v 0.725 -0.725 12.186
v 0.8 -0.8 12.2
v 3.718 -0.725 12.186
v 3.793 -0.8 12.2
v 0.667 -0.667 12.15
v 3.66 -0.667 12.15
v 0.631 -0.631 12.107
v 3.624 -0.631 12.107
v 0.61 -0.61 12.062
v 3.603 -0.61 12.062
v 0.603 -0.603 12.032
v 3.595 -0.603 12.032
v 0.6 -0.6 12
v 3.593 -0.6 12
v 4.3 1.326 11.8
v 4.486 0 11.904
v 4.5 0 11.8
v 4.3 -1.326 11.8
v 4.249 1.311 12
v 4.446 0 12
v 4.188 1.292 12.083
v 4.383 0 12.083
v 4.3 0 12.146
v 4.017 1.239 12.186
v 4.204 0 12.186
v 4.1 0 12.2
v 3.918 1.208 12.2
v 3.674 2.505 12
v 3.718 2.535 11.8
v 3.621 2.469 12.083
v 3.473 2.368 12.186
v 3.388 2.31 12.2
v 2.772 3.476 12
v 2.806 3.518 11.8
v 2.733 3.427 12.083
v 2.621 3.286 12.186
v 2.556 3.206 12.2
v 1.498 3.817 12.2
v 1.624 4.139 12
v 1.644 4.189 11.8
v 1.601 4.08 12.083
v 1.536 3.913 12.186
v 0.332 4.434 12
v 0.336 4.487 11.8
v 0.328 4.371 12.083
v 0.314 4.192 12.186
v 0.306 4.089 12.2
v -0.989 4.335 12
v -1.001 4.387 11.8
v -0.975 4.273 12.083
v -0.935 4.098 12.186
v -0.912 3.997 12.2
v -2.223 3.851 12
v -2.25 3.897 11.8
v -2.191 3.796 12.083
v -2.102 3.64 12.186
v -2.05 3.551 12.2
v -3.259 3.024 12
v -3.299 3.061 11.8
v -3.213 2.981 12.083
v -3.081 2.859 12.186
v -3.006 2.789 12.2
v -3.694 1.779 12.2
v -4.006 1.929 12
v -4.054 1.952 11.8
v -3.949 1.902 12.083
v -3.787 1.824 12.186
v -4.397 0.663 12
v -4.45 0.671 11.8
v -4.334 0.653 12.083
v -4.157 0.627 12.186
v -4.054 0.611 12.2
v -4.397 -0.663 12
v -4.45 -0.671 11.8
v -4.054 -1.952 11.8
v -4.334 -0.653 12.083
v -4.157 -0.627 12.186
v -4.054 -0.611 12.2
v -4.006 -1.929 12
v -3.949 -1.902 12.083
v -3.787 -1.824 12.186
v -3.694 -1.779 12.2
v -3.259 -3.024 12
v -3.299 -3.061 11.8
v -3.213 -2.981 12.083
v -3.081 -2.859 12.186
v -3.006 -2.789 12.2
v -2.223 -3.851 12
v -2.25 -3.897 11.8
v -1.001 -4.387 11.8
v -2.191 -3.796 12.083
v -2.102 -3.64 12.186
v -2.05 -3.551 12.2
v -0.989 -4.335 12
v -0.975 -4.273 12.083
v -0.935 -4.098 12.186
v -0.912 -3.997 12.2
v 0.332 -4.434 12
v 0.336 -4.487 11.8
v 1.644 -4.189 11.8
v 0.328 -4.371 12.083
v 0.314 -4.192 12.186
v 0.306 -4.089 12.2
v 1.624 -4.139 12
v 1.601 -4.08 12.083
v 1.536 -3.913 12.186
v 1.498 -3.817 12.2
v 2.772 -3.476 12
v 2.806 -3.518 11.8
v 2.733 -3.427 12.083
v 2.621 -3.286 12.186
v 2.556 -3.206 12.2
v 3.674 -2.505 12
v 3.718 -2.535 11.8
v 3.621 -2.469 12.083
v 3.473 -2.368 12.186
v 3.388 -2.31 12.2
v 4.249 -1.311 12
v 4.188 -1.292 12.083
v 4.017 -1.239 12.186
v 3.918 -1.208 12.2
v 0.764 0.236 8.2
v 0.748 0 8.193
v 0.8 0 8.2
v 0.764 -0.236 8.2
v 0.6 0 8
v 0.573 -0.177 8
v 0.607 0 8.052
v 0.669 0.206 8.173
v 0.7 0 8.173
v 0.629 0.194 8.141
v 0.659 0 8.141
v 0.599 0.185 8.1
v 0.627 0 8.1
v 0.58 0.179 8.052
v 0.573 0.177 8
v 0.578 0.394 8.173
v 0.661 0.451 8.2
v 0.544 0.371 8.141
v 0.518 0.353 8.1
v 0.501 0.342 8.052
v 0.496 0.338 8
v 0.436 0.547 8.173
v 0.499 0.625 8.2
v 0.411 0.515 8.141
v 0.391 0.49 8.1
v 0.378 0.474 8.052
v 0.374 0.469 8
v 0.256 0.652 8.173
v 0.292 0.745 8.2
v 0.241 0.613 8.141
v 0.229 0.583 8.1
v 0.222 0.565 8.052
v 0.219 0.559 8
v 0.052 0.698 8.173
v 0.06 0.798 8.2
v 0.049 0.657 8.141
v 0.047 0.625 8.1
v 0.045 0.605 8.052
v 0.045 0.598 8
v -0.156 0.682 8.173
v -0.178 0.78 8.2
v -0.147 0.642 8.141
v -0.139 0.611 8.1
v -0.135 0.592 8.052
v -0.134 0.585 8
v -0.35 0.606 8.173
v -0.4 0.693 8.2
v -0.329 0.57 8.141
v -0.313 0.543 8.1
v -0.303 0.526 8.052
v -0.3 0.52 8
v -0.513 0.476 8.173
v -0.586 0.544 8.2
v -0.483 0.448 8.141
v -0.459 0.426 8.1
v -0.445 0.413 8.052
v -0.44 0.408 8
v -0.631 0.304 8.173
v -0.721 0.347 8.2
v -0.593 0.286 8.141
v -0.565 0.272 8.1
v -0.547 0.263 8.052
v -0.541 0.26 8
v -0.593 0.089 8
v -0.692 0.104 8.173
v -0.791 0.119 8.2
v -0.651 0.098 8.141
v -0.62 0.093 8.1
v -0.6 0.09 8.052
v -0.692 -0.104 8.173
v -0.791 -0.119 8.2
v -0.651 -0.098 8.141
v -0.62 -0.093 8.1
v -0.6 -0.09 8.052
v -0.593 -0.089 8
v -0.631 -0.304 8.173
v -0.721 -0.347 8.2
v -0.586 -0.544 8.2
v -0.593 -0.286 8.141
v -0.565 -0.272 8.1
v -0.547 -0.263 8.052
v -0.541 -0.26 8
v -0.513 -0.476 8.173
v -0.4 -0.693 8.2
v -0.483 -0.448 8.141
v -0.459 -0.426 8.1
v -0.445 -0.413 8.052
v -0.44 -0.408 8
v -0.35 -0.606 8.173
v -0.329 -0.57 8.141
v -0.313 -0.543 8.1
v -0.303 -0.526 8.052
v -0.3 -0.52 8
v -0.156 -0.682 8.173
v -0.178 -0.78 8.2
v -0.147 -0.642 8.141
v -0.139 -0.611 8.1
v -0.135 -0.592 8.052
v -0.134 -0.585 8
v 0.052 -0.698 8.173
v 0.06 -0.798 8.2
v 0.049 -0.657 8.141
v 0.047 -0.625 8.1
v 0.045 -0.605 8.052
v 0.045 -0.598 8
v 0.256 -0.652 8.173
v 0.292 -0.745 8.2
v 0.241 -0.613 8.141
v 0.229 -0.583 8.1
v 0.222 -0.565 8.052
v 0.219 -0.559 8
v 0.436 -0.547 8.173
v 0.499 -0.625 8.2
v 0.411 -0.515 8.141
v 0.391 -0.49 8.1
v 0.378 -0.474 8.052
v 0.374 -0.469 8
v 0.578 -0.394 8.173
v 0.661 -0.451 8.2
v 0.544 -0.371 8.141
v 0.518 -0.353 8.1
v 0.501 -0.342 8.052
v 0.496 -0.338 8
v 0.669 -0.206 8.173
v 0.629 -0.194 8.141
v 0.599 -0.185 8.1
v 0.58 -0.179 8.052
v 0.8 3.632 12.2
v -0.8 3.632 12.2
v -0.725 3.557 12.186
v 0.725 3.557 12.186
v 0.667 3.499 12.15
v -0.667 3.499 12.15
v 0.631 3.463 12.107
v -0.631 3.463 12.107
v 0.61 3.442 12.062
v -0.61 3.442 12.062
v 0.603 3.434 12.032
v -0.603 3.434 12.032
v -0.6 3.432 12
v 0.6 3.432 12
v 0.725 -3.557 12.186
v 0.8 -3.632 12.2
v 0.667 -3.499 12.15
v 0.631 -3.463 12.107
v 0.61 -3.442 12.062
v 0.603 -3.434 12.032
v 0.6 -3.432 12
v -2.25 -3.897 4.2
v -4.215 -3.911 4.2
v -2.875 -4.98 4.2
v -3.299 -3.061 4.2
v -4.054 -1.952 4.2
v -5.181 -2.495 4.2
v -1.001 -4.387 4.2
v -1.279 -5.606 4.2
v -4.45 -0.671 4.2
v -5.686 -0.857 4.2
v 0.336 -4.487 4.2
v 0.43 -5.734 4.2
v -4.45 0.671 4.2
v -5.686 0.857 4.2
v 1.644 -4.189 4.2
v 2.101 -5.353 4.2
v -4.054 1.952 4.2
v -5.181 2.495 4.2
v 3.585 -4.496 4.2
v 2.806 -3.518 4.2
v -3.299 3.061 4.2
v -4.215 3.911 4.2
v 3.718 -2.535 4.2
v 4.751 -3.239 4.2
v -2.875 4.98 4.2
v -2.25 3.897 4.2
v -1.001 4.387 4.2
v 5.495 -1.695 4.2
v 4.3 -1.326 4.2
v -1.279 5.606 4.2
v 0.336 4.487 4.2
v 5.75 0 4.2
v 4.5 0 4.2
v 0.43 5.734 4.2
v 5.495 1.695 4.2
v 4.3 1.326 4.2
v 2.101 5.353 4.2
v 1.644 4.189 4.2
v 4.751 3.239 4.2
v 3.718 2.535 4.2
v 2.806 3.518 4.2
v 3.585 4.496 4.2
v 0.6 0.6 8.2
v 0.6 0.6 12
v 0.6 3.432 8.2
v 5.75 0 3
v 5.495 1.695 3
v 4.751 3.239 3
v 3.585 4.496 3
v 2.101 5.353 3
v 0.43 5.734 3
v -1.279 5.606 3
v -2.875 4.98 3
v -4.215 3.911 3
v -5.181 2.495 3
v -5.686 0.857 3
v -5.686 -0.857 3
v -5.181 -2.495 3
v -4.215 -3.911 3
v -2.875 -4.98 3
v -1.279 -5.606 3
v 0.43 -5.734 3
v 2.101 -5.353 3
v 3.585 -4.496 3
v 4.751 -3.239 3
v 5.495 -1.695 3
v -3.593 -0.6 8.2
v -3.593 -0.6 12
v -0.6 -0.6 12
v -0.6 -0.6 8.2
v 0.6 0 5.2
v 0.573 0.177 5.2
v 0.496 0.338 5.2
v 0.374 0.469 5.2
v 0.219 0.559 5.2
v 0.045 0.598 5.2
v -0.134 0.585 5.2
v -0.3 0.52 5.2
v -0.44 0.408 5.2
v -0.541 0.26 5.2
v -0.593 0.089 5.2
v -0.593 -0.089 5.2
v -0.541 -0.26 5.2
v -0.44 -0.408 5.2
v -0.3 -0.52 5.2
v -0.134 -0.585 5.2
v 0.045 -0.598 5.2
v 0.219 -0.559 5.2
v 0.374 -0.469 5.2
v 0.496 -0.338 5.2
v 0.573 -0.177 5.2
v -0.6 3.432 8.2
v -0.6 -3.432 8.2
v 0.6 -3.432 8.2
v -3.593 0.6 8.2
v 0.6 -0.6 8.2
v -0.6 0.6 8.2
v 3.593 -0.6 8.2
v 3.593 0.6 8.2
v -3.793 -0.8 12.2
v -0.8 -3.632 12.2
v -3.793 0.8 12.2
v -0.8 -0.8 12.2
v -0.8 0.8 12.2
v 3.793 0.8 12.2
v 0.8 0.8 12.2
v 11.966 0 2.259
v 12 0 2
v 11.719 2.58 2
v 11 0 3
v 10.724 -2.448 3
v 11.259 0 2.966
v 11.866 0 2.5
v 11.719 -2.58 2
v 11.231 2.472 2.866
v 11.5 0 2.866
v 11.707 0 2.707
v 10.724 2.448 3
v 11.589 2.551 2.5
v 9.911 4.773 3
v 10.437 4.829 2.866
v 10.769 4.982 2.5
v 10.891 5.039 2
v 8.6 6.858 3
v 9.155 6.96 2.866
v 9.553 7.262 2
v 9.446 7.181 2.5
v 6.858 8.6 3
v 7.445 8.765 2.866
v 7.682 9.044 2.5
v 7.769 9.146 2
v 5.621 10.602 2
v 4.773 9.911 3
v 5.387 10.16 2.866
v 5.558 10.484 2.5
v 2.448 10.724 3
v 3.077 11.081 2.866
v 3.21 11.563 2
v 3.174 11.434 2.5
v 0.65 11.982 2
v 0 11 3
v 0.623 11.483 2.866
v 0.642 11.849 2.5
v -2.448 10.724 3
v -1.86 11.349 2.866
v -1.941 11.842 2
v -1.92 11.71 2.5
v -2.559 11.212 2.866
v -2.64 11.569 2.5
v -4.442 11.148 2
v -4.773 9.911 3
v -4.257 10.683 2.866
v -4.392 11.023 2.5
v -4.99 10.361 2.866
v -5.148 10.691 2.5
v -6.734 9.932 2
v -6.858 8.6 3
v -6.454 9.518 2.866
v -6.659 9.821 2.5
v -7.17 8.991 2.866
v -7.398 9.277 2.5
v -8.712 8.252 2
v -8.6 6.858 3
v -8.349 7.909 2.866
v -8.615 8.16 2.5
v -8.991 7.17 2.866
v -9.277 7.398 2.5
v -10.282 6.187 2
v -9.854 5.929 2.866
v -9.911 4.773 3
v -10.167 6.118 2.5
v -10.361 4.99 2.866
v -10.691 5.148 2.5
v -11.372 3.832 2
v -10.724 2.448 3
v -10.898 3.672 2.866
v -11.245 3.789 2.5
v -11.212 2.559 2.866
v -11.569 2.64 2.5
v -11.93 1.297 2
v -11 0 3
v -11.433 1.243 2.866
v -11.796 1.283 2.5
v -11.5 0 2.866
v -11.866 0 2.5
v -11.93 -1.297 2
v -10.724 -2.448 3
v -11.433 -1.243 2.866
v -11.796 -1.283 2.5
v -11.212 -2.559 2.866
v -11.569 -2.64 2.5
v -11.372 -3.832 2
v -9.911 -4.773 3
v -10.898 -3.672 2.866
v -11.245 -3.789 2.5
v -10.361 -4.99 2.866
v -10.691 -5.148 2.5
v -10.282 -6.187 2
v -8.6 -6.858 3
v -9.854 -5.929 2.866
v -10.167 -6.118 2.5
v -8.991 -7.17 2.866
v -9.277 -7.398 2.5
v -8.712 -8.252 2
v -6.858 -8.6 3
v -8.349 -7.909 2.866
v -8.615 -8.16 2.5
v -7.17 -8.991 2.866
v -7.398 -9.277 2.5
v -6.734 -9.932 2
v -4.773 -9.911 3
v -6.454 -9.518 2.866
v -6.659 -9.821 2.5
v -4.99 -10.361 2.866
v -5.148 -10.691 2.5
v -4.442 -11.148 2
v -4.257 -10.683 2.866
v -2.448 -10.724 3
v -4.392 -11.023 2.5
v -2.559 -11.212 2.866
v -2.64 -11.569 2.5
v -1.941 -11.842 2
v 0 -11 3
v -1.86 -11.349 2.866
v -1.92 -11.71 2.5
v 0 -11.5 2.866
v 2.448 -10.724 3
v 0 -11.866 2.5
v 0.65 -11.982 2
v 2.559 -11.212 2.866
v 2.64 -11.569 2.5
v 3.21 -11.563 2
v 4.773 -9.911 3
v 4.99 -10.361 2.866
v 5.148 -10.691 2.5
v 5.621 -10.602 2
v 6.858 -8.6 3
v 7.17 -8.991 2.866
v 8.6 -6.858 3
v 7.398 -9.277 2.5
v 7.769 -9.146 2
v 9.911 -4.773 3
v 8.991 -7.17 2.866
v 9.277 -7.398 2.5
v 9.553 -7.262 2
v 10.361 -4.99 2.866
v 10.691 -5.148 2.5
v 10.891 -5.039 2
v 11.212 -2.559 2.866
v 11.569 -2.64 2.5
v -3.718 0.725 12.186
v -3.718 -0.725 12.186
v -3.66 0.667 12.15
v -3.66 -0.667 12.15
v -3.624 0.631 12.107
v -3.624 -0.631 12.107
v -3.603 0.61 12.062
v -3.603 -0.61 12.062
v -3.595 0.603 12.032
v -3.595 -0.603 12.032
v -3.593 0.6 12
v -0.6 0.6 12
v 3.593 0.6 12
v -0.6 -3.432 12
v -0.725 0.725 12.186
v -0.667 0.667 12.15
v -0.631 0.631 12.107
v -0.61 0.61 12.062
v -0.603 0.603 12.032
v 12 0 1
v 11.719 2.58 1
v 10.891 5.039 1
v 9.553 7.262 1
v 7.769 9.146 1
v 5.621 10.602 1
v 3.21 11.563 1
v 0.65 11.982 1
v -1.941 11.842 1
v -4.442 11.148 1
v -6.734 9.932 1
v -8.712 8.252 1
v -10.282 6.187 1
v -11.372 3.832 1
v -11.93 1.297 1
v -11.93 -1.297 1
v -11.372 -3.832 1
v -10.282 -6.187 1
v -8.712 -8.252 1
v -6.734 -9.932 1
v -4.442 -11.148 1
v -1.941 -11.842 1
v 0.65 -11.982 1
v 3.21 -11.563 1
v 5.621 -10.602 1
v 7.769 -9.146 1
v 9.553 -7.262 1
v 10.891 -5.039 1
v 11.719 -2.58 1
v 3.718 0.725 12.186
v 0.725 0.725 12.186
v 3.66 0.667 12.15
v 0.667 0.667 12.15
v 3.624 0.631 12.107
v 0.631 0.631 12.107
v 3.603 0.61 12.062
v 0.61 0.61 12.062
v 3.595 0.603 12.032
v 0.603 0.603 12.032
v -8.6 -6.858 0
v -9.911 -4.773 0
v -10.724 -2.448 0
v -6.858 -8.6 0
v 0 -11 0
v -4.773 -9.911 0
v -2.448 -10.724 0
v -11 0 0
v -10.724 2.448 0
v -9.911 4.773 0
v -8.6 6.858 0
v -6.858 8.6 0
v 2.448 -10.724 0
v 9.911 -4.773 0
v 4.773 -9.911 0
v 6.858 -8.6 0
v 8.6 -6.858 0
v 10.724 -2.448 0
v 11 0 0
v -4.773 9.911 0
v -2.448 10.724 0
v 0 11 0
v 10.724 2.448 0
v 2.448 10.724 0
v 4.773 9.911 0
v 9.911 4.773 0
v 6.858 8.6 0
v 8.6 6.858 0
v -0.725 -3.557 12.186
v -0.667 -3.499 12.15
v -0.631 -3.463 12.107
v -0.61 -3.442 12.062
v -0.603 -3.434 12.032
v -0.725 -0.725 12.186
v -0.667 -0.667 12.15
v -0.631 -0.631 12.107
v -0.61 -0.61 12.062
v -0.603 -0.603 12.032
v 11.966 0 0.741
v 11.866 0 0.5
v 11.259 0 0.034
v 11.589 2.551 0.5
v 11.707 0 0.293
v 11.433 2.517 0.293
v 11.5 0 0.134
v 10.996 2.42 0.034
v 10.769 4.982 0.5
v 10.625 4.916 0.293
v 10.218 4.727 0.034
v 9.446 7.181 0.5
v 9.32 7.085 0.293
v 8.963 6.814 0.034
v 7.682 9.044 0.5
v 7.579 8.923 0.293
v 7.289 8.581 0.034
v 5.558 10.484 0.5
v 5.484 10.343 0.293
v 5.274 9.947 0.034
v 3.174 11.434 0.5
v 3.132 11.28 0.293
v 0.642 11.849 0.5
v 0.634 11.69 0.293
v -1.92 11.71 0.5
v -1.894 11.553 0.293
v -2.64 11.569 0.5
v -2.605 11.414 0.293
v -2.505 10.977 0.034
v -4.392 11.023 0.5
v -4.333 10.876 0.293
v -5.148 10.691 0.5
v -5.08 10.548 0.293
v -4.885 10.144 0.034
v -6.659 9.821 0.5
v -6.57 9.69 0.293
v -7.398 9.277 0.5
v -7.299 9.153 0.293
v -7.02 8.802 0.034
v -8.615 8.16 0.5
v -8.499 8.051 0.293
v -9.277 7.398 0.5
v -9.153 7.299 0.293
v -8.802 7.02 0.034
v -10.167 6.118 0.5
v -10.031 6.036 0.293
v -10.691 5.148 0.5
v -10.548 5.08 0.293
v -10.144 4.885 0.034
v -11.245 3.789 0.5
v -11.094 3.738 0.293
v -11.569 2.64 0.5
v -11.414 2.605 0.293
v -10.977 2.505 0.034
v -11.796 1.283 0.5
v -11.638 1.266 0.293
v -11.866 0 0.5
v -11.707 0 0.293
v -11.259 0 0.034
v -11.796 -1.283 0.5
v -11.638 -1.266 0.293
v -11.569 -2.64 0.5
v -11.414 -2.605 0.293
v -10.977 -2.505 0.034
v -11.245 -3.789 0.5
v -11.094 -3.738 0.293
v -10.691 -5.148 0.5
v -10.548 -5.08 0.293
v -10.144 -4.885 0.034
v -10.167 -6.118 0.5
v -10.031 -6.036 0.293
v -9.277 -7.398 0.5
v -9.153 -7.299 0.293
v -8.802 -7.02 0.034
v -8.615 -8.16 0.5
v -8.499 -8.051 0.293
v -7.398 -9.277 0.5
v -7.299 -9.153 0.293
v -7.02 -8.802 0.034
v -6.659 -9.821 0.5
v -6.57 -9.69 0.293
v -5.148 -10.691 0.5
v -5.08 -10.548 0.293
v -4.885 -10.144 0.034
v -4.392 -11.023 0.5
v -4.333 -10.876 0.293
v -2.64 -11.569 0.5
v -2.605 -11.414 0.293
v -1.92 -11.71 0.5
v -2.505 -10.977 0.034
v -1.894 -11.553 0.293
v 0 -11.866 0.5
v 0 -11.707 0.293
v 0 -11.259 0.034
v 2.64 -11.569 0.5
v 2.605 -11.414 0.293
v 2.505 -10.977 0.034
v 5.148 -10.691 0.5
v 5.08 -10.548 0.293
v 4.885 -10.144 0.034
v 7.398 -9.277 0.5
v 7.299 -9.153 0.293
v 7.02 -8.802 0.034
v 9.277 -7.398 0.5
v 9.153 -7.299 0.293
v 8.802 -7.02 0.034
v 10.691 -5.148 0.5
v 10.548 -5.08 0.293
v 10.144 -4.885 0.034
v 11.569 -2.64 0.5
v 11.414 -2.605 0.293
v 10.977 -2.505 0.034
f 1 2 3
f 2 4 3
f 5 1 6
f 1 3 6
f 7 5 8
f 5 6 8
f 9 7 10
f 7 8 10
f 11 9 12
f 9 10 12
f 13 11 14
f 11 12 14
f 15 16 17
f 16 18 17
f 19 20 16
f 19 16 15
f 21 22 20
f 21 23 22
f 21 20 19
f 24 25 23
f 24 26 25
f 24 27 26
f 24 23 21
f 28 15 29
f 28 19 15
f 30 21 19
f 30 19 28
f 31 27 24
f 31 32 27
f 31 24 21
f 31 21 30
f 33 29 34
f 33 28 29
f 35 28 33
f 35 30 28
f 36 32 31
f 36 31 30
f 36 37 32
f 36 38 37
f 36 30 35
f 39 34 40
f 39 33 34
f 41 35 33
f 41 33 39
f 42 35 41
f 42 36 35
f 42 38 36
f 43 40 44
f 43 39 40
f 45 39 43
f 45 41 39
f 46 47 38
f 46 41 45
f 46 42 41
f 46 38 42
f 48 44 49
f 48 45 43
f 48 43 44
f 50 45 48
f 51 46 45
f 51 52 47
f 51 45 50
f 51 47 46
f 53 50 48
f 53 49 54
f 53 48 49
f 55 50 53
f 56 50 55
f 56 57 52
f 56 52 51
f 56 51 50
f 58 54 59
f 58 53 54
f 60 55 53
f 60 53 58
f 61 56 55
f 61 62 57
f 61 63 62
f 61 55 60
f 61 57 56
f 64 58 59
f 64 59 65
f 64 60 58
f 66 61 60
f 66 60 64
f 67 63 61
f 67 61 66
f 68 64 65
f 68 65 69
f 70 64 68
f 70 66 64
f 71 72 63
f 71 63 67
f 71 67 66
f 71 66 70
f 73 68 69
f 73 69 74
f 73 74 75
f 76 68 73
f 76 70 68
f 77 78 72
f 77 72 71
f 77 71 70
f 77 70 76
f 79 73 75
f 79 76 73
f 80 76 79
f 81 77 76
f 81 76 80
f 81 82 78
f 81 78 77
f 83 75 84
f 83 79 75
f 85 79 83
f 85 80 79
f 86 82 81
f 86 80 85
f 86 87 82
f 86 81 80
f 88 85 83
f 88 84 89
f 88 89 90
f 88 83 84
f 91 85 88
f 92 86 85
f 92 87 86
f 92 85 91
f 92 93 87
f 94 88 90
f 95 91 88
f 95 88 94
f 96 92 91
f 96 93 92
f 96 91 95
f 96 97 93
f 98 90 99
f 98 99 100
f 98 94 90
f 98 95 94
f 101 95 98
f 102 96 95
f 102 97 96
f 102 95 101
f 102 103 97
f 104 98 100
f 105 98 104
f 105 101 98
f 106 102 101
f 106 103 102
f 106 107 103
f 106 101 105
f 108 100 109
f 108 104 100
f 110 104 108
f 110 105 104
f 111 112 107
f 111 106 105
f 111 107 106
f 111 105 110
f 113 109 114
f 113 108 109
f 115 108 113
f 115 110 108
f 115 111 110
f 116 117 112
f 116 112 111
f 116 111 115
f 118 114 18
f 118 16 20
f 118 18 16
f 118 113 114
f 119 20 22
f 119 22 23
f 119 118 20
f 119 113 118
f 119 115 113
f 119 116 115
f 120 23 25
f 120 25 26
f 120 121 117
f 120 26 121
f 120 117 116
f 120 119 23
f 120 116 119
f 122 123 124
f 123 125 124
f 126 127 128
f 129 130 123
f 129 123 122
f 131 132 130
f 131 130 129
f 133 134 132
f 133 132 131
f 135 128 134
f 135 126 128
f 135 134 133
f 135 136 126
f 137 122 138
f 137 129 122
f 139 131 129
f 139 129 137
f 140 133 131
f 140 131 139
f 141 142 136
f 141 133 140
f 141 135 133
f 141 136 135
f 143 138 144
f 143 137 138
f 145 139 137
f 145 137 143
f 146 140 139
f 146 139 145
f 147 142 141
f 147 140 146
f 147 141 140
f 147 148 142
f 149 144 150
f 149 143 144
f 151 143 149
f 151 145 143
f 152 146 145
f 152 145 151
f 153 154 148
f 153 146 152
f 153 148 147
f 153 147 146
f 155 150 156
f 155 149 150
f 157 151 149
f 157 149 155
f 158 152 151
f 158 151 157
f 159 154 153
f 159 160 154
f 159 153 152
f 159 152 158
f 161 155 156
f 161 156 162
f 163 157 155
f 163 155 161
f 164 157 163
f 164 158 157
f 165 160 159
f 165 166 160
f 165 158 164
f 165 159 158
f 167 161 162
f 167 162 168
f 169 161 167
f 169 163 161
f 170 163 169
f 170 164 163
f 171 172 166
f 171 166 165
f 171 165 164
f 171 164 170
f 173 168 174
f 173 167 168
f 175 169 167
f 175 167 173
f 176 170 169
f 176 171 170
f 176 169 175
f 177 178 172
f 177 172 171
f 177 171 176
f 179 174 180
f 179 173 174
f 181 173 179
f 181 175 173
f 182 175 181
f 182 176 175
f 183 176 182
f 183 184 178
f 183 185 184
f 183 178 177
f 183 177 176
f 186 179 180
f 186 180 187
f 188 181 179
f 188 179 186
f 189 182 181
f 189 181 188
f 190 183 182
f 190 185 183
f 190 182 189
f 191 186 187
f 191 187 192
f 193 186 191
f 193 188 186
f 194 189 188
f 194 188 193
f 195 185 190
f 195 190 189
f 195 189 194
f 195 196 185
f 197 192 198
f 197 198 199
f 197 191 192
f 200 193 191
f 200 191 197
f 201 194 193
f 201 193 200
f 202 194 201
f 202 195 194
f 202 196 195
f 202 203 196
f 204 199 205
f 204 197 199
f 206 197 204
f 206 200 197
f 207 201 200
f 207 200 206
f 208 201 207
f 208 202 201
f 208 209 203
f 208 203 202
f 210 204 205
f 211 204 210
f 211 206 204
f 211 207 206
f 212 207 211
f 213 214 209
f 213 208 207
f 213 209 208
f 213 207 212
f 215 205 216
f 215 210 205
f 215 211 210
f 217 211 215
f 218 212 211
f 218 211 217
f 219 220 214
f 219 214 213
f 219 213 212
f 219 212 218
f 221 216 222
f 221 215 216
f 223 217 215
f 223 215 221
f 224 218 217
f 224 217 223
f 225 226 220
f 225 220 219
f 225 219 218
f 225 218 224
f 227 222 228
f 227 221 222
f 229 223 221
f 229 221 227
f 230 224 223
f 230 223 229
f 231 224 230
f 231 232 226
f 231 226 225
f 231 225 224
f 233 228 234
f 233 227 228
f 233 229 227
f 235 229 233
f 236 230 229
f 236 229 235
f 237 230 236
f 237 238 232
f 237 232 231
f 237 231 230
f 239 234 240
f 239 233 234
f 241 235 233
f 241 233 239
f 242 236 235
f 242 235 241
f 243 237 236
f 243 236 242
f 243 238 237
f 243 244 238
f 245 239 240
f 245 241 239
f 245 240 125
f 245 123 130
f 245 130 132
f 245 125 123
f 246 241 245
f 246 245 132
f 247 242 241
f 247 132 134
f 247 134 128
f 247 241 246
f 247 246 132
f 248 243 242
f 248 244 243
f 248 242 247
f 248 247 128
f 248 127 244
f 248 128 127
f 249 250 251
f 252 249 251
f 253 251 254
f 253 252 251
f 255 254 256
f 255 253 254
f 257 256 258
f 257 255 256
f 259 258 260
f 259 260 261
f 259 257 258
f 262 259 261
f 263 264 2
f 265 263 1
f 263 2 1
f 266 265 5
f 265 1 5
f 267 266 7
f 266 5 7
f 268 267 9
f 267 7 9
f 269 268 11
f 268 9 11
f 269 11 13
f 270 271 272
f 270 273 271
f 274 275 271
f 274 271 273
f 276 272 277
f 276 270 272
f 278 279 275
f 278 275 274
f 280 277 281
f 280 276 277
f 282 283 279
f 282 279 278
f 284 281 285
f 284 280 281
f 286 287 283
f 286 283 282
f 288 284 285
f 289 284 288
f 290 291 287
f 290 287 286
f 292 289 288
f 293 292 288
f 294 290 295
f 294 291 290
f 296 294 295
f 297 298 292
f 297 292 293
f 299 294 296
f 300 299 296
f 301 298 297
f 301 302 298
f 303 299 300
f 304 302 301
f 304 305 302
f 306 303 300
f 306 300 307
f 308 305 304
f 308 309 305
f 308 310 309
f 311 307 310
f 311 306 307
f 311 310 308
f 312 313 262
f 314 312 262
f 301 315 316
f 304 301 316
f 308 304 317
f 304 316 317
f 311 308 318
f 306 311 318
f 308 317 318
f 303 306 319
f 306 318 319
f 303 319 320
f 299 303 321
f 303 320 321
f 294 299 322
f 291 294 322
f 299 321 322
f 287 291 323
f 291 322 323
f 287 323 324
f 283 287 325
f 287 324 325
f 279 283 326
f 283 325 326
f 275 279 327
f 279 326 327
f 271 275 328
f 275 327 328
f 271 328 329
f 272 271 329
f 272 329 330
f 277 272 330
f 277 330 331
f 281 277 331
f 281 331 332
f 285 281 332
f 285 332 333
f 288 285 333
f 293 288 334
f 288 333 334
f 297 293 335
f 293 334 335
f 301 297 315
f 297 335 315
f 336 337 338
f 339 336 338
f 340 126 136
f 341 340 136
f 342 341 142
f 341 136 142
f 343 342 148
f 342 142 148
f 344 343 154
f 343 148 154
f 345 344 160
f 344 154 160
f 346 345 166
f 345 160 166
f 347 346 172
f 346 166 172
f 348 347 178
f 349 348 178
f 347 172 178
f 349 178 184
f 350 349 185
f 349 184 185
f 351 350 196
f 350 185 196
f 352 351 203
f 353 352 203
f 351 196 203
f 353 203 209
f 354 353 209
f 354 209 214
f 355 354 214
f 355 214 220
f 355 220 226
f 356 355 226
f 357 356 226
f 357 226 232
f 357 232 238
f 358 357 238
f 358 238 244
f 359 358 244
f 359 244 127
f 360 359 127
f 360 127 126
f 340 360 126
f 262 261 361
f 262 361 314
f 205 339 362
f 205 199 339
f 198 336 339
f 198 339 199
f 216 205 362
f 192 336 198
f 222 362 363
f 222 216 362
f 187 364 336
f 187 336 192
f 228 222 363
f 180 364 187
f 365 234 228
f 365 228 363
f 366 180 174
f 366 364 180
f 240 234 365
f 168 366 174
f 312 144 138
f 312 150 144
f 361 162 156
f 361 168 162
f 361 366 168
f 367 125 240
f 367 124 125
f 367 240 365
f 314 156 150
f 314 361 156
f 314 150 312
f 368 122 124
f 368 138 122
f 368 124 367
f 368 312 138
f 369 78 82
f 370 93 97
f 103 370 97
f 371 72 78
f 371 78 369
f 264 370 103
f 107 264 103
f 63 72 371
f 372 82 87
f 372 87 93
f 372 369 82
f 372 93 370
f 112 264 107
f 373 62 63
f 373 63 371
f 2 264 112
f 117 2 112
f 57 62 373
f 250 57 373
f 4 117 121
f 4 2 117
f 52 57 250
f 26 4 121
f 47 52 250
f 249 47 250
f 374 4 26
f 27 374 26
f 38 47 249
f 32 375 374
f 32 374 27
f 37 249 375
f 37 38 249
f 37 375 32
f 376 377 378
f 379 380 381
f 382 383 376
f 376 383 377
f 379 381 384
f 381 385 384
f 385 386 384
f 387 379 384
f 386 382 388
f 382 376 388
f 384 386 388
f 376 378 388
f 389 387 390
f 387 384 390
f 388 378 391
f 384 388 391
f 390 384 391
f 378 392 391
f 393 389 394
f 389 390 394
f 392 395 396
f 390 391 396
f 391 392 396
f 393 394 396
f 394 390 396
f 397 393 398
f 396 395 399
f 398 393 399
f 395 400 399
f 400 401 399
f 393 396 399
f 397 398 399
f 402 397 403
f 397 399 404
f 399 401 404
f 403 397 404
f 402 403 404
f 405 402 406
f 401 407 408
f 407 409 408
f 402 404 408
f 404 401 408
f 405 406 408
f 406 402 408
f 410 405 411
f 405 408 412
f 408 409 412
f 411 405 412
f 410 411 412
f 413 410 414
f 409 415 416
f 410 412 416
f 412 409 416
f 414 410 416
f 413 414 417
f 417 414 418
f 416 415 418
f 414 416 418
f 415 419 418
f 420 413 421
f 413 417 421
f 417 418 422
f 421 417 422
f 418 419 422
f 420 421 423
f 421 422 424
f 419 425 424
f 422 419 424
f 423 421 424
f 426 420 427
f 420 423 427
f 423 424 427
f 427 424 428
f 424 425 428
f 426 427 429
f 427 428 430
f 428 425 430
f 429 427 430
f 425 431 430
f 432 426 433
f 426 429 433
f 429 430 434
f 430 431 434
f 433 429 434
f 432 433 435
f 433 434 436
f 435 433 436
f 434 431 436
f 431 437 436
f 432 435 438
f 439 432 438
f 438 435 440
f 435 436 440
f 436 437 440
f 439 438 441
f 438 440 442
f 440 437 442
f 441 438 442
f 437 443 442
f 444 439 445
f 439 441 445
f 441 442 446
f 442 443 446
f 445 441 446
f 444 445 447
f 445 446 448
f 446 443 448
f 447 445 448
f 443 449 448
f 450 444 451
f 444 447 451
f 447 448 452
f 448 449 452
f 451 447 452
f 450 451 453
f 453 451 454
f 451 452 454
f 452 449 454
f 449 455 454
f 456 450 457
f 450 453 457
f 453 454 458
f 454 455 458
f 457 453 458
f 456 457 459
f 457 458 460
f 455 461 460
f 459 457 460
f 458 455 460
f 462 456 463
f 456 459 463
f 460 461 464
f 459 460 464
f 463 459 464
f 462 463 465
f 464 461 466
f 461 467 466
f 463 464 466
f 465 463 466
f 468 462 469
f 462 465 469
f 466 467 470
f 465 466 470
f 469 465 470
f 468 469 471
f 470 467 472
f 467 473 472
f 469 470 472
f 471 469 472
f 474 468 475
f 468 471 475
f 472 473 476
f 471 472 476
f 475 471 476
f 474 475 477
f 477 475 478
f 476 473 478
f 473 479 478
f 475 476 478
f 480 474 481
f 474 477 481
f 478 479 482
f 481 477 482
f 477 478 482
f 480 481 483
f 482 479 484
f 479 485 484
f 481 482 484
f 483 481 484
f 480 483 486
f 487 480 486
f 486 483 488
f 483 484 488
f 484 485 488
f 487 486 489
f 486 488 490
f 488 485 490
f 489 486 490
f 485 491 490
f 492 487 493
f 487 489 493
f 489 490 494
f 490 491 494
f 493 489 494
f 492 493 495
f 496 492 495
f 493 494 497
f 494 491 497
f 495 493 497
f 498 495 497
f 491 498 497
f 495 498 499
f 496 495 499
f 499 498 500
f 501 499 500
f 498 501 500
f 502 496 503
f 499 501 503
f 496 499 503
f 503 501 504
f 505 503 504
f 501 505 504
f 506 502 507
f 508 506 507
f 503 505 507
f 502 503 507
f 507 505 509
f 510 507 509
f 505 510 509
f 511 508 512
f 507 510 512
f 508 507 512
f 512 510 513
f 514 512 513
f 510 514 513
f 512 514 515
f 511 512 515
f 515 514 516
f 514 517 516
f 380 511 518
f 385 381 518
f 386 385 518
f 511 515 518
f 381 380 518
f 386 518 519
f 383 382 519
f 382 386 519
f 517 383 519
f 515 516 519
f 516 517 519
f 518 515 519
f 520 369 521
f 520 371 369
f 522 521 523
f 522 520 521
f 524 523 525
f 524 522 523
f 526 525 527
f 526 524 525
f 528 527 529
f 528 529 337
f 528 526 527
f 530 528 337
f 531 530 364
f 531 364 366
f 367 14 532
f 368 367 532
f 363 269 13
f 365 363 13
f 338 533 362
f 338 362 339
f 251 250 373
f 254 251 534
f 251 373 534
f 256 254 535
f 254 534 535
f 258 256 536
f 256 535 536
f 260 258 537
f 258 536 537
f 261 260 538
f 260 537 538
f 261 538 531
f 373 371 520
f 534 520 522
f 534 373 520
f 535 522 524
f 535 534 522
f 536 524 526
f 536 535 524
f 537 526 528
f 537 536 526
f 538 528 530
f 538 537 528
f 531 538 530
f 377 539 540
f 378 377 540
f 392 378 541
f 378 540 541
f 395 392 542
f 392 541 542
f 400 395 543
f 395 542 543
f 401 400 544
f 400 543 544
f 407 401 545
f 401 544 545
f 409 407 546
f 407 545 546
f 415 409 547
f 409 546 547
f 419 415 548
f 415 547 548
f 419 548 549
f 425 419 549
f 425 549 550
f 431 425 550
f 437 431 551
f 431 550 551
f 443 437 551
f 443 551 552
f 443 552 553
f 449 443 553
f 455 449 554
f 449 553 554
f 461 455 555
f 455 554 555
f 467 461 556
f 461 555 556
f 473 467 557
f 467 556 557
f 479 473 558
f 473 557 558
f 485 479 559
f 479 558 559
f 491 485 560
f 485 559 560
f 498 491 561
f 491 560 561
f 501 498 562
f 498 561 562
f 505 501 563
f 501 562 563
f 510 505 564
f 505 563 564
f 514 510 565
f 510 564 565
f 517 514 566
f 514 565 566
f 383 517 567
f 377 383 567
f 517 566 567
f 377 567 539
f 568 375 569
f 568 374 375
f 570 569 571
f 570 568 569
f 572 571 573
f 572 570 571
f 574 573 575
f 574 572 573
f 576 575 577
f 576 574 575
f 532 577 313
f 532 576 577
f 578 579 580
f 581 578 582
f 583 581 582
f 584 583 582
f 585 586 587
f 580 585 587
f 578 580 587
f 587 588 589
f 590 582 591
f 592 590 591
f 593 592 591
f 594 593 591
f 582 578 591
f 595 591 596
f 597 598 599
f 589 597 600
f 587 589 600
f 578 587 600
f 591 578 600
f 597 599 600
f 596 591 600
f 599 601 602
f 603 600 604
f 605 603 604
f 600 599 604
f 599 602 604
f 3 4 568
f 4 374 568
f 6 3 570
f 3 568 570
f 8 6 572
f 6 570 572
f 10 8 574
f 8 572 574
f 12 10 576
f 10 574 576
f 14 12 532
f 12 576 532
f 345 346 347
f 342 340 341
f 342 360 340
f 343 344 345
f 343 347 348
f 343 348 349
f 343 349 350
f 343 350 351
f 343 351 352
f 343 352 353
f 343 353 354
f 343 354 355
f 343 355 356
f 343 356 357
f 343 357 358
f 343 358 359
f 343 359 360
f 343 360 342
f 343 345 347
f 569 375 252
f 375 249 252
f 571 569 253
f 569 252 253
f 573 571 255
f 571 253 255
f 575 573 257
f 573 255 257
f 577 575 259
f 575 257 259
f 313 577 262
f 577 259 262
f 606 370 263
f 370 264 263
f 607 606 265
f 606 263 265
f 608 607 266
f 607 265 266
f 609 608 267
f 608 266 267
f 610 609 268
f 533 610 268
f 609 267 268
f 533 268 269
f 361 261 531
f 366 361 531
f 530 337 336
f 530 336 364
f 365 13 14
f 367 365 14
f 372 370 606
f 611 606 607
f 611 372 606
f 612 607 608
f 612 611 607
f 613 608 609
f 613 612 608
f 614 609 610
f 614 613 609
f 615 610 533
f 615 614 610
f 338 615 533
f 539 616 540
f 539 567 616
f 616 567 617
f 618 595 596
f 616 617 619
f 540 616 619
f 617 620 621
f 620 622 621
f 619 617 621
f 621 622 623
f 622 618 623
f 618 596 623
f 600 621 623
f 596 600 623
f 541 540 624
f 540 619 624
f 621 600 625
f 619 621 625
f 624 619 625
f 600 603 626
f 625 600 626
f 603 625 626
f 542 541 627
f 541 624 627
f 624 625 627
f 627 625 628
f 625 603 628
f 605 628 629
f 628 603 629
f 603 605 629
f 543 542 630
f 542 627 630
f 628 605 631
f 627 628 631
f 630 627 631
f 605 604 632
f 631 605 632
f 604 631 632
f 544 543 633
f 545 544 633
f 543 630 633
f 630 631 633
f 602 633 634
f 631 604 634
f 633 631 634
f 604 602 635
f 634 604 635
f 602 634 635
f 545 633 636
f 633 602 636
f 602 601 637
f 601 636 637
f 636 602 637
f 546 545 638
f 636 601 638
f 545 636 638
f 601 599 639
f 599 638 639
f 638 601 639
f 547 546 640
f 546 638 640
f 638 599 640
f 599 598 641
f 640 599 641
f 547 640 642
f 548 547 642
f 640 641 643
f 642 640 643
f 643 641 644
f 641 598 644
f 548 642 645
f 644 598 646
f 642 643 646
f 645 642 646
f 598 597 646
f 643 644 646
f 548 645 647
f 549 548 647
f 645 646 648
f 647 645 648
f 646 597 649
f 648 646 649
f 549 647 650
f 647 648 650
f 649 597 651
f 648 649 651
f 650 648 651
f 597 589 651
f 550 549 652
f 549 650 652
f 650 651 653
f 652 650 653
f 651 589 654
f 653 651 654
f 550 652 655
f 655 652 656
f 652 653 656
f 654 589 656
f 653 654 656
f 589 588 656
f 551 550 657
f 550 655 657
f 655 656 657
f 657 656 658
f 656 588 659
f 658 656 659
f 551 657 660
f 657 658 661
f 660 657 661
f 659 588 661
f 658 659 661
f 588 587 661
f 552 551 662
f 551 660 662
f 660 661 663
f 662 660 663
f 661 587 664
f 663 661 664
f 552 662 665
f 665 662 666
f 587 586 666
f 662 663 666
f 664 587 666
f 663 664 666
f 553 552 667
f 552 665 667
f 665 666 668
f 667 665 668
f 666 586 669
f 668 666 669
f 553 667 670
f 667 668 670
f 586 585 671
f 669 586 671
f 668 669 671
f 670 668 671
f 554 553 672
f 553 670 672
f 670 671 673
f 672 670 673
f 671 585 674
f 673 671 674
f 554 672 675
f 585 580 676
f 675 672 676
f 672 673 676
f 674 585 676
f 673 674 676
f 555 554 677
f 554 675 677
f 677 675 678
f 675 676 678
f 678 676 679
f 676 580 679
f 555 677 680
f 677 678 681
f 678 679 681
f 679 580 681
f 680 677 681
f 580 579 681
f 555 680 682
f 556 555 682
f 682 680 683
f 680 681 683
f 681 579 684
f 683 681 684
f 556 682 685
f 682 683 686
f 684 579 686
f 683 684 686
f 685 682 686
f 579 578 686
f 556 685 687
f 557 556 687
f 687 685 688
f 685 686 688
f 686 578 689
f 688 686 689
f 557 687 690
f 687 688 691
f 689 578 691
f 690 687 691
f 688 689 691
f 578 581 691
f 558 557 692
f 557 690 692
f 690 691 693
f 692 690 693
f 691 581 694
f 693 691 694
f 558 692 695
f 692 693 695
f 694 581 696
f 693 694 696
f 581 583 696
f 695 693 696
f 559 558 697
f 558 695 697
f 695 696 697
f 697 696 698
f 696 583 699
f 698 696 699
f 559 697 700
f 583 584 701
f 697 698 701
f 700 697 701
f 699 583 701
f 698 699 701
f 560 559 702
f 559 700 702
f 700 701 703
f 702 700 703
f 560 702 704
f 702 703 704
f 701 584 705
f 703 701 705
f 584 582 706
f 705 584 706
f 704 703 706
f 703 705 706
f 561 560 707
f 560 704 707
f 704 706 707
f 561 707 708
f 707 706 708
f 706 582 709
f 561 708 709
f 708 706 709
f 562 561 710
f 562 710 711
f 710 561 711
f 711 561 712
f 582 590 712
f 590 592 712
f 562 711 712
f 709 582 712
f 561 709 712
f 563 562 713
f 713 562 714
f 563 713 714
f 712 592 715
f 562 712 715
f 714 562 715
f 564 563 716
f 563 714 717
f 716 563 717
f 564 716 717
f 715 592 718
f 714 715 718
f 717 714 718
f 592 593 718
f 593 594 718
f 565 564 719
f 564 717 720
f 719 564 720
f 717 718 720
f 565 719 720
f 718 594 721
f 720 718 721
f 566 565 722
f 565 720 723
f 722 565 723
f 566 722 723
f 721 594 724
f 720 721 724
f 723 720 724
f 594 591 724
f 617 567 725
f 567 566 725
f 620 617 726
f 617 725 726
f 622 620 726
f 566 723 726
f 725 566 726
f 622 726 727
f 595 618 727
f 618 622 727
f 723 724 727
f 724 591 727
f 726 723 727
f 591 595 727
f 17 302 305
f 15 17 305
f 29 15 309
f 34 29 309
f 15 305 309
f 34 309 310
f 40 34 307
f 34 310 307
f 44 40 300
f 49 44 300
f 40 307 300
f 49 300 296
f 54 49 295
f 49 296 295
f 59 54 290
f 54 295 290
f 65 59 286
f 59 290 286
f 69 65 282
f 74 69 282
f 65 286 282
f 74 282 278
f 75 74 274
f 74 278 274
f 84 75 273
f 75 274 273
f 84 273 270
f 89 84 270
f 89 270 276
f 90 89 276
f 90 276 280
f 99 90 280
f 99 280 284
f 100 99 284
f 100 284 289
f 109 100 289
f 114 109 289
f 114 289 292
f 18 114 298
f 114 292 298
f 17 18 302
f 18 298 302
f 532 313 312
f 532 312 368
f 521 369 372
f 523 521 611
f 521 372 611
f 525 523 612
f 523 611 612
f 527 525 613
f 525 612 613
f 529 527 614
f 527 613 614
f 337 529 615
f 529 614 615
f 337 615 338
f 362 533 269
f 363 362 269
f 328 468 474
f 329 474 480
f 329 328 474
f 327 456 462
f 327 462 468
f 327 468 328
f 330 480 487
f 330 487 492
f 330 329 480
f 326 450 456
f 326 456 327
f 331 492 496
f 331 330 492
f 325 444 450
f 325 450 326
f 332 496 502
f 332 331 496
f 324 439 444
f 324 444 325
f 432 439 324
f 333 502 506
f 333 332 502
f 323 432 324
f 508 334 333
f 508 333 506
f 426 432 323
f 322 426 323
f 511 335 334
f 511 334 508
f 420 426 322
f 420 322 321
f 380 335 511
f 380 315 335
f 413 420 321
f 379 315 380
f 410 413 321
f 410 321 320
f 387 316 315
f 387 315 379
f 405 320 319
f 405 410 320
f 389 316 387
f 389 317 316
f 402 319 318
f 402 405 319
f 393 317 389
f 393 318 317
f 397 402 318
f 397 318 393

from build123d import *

# Parameters (mm, degrees)
F0_R      = 12
F1_DEPTH  = 3
F2_R      = 5.75
F3_DEPTH  = 1.2
F4_R      = 4.5
F5_DEPTH  = 8
F6_R      = 0.6
F10_DEPTH = 7
F11_W     = 1.2
F11_H     = 2.8315826069
F11_H_2   = 1.2
F11_W_2   = 2.9928033758
F12_DEPTH = 4
F13_R     = 0.4
F14_R     = 1
F15_R     = 0.2


# Not quite as in the source:
# - a feature of the source that left no trace in its solid (it failed there, or was rolled back) is left out


with BuildPart() as f1:
    # F0 (on Top) → F1 (new body)
    with BuildSketch(Plane.XY):
        Circle(F0_R)
    extrude(amount=F1_DEPTH)

    # F2 (on face) → F3 (join)
    with BuildSketch(Plane.XY.offset(3)):
        Circle(F2_R)
    extrude(amount=F3_DEPTH)

    # F4 (on face) → F5 (join)
    with BuildSketch(Plane.XY.offset(4.2)):
        Circle(F4_R)
    extrude(amount=F5_DEPTH)

    # F6 (on face) → F10 (cut)
    with BuildSketch(Plane.XY.offset(12.2)):
        Circle(F6_R)
    extrude(amount=-F10_DEPTH, mode=Mode.SUBTRACT)

    # F11 (on face) → F12 (cut)
    with BuildSketch(Plane.XY.offset(12.2)):
        with Locations((0, 2.0157913034)):
            Rectangle(F11_W, F11_H)
        Rectangle(F11_W, F11_H_2)
        with Locations((-2.0964016879, 0)):
            Rectangle(F11_W_2, F11_H_2)
        with Locations((2.0964016879, 0)):
            Rectangle(F11_W_2, F11_H_2)
        with Locations((0, -2.0157913034)):
            Rectangle(F11_W, F11_H)
    extrude(amount=-F12_DEPTH, mode=Mode.SUBTRACT)

    # F13
    f13_edges = [f1.edges().sort_by_distance(p)[0] for p in [
        (-4.5, 0, 12.2),
    ]]
    fillet(f13_edges, radius=F13_R)

    # F14
    f14_edges = [f1.edges().sort_by_distance(p)[0] for p in [
        (-12, 0, 3),
        (-12, 0, 0),
    ]]
    fillet(f14_edges, radius=F14_R)

    # F15
    f15_edges = [f1.edges().sort_by_distance(p)[0] for p in [
        (-4.1, 0, 12.2),
        (0, 3.431583, 12.2),
        (-0.6, 2.015791, 12.2),
        (-2.096402, 0.6, 12.2),
        (-3.592803, 0, 12.2),
        (-2.096402, -0.6, 12.2),
        (-0.6, -2.015791, 12.2),
        (0, -3.431583, 12.2),
        (0.6, -2.015791, 12.2),
        (2.096402, -0.6, 12.2),
        (3.592803, 0, 12.2),
        (2.096402, 0.6, 12.2),
        (0.6, 2.015791, 12.2),
        (-0.6, 0, 8.2),
    ]]
    fillet(f15_edges, radius=F15_R)


solid = f1.part
